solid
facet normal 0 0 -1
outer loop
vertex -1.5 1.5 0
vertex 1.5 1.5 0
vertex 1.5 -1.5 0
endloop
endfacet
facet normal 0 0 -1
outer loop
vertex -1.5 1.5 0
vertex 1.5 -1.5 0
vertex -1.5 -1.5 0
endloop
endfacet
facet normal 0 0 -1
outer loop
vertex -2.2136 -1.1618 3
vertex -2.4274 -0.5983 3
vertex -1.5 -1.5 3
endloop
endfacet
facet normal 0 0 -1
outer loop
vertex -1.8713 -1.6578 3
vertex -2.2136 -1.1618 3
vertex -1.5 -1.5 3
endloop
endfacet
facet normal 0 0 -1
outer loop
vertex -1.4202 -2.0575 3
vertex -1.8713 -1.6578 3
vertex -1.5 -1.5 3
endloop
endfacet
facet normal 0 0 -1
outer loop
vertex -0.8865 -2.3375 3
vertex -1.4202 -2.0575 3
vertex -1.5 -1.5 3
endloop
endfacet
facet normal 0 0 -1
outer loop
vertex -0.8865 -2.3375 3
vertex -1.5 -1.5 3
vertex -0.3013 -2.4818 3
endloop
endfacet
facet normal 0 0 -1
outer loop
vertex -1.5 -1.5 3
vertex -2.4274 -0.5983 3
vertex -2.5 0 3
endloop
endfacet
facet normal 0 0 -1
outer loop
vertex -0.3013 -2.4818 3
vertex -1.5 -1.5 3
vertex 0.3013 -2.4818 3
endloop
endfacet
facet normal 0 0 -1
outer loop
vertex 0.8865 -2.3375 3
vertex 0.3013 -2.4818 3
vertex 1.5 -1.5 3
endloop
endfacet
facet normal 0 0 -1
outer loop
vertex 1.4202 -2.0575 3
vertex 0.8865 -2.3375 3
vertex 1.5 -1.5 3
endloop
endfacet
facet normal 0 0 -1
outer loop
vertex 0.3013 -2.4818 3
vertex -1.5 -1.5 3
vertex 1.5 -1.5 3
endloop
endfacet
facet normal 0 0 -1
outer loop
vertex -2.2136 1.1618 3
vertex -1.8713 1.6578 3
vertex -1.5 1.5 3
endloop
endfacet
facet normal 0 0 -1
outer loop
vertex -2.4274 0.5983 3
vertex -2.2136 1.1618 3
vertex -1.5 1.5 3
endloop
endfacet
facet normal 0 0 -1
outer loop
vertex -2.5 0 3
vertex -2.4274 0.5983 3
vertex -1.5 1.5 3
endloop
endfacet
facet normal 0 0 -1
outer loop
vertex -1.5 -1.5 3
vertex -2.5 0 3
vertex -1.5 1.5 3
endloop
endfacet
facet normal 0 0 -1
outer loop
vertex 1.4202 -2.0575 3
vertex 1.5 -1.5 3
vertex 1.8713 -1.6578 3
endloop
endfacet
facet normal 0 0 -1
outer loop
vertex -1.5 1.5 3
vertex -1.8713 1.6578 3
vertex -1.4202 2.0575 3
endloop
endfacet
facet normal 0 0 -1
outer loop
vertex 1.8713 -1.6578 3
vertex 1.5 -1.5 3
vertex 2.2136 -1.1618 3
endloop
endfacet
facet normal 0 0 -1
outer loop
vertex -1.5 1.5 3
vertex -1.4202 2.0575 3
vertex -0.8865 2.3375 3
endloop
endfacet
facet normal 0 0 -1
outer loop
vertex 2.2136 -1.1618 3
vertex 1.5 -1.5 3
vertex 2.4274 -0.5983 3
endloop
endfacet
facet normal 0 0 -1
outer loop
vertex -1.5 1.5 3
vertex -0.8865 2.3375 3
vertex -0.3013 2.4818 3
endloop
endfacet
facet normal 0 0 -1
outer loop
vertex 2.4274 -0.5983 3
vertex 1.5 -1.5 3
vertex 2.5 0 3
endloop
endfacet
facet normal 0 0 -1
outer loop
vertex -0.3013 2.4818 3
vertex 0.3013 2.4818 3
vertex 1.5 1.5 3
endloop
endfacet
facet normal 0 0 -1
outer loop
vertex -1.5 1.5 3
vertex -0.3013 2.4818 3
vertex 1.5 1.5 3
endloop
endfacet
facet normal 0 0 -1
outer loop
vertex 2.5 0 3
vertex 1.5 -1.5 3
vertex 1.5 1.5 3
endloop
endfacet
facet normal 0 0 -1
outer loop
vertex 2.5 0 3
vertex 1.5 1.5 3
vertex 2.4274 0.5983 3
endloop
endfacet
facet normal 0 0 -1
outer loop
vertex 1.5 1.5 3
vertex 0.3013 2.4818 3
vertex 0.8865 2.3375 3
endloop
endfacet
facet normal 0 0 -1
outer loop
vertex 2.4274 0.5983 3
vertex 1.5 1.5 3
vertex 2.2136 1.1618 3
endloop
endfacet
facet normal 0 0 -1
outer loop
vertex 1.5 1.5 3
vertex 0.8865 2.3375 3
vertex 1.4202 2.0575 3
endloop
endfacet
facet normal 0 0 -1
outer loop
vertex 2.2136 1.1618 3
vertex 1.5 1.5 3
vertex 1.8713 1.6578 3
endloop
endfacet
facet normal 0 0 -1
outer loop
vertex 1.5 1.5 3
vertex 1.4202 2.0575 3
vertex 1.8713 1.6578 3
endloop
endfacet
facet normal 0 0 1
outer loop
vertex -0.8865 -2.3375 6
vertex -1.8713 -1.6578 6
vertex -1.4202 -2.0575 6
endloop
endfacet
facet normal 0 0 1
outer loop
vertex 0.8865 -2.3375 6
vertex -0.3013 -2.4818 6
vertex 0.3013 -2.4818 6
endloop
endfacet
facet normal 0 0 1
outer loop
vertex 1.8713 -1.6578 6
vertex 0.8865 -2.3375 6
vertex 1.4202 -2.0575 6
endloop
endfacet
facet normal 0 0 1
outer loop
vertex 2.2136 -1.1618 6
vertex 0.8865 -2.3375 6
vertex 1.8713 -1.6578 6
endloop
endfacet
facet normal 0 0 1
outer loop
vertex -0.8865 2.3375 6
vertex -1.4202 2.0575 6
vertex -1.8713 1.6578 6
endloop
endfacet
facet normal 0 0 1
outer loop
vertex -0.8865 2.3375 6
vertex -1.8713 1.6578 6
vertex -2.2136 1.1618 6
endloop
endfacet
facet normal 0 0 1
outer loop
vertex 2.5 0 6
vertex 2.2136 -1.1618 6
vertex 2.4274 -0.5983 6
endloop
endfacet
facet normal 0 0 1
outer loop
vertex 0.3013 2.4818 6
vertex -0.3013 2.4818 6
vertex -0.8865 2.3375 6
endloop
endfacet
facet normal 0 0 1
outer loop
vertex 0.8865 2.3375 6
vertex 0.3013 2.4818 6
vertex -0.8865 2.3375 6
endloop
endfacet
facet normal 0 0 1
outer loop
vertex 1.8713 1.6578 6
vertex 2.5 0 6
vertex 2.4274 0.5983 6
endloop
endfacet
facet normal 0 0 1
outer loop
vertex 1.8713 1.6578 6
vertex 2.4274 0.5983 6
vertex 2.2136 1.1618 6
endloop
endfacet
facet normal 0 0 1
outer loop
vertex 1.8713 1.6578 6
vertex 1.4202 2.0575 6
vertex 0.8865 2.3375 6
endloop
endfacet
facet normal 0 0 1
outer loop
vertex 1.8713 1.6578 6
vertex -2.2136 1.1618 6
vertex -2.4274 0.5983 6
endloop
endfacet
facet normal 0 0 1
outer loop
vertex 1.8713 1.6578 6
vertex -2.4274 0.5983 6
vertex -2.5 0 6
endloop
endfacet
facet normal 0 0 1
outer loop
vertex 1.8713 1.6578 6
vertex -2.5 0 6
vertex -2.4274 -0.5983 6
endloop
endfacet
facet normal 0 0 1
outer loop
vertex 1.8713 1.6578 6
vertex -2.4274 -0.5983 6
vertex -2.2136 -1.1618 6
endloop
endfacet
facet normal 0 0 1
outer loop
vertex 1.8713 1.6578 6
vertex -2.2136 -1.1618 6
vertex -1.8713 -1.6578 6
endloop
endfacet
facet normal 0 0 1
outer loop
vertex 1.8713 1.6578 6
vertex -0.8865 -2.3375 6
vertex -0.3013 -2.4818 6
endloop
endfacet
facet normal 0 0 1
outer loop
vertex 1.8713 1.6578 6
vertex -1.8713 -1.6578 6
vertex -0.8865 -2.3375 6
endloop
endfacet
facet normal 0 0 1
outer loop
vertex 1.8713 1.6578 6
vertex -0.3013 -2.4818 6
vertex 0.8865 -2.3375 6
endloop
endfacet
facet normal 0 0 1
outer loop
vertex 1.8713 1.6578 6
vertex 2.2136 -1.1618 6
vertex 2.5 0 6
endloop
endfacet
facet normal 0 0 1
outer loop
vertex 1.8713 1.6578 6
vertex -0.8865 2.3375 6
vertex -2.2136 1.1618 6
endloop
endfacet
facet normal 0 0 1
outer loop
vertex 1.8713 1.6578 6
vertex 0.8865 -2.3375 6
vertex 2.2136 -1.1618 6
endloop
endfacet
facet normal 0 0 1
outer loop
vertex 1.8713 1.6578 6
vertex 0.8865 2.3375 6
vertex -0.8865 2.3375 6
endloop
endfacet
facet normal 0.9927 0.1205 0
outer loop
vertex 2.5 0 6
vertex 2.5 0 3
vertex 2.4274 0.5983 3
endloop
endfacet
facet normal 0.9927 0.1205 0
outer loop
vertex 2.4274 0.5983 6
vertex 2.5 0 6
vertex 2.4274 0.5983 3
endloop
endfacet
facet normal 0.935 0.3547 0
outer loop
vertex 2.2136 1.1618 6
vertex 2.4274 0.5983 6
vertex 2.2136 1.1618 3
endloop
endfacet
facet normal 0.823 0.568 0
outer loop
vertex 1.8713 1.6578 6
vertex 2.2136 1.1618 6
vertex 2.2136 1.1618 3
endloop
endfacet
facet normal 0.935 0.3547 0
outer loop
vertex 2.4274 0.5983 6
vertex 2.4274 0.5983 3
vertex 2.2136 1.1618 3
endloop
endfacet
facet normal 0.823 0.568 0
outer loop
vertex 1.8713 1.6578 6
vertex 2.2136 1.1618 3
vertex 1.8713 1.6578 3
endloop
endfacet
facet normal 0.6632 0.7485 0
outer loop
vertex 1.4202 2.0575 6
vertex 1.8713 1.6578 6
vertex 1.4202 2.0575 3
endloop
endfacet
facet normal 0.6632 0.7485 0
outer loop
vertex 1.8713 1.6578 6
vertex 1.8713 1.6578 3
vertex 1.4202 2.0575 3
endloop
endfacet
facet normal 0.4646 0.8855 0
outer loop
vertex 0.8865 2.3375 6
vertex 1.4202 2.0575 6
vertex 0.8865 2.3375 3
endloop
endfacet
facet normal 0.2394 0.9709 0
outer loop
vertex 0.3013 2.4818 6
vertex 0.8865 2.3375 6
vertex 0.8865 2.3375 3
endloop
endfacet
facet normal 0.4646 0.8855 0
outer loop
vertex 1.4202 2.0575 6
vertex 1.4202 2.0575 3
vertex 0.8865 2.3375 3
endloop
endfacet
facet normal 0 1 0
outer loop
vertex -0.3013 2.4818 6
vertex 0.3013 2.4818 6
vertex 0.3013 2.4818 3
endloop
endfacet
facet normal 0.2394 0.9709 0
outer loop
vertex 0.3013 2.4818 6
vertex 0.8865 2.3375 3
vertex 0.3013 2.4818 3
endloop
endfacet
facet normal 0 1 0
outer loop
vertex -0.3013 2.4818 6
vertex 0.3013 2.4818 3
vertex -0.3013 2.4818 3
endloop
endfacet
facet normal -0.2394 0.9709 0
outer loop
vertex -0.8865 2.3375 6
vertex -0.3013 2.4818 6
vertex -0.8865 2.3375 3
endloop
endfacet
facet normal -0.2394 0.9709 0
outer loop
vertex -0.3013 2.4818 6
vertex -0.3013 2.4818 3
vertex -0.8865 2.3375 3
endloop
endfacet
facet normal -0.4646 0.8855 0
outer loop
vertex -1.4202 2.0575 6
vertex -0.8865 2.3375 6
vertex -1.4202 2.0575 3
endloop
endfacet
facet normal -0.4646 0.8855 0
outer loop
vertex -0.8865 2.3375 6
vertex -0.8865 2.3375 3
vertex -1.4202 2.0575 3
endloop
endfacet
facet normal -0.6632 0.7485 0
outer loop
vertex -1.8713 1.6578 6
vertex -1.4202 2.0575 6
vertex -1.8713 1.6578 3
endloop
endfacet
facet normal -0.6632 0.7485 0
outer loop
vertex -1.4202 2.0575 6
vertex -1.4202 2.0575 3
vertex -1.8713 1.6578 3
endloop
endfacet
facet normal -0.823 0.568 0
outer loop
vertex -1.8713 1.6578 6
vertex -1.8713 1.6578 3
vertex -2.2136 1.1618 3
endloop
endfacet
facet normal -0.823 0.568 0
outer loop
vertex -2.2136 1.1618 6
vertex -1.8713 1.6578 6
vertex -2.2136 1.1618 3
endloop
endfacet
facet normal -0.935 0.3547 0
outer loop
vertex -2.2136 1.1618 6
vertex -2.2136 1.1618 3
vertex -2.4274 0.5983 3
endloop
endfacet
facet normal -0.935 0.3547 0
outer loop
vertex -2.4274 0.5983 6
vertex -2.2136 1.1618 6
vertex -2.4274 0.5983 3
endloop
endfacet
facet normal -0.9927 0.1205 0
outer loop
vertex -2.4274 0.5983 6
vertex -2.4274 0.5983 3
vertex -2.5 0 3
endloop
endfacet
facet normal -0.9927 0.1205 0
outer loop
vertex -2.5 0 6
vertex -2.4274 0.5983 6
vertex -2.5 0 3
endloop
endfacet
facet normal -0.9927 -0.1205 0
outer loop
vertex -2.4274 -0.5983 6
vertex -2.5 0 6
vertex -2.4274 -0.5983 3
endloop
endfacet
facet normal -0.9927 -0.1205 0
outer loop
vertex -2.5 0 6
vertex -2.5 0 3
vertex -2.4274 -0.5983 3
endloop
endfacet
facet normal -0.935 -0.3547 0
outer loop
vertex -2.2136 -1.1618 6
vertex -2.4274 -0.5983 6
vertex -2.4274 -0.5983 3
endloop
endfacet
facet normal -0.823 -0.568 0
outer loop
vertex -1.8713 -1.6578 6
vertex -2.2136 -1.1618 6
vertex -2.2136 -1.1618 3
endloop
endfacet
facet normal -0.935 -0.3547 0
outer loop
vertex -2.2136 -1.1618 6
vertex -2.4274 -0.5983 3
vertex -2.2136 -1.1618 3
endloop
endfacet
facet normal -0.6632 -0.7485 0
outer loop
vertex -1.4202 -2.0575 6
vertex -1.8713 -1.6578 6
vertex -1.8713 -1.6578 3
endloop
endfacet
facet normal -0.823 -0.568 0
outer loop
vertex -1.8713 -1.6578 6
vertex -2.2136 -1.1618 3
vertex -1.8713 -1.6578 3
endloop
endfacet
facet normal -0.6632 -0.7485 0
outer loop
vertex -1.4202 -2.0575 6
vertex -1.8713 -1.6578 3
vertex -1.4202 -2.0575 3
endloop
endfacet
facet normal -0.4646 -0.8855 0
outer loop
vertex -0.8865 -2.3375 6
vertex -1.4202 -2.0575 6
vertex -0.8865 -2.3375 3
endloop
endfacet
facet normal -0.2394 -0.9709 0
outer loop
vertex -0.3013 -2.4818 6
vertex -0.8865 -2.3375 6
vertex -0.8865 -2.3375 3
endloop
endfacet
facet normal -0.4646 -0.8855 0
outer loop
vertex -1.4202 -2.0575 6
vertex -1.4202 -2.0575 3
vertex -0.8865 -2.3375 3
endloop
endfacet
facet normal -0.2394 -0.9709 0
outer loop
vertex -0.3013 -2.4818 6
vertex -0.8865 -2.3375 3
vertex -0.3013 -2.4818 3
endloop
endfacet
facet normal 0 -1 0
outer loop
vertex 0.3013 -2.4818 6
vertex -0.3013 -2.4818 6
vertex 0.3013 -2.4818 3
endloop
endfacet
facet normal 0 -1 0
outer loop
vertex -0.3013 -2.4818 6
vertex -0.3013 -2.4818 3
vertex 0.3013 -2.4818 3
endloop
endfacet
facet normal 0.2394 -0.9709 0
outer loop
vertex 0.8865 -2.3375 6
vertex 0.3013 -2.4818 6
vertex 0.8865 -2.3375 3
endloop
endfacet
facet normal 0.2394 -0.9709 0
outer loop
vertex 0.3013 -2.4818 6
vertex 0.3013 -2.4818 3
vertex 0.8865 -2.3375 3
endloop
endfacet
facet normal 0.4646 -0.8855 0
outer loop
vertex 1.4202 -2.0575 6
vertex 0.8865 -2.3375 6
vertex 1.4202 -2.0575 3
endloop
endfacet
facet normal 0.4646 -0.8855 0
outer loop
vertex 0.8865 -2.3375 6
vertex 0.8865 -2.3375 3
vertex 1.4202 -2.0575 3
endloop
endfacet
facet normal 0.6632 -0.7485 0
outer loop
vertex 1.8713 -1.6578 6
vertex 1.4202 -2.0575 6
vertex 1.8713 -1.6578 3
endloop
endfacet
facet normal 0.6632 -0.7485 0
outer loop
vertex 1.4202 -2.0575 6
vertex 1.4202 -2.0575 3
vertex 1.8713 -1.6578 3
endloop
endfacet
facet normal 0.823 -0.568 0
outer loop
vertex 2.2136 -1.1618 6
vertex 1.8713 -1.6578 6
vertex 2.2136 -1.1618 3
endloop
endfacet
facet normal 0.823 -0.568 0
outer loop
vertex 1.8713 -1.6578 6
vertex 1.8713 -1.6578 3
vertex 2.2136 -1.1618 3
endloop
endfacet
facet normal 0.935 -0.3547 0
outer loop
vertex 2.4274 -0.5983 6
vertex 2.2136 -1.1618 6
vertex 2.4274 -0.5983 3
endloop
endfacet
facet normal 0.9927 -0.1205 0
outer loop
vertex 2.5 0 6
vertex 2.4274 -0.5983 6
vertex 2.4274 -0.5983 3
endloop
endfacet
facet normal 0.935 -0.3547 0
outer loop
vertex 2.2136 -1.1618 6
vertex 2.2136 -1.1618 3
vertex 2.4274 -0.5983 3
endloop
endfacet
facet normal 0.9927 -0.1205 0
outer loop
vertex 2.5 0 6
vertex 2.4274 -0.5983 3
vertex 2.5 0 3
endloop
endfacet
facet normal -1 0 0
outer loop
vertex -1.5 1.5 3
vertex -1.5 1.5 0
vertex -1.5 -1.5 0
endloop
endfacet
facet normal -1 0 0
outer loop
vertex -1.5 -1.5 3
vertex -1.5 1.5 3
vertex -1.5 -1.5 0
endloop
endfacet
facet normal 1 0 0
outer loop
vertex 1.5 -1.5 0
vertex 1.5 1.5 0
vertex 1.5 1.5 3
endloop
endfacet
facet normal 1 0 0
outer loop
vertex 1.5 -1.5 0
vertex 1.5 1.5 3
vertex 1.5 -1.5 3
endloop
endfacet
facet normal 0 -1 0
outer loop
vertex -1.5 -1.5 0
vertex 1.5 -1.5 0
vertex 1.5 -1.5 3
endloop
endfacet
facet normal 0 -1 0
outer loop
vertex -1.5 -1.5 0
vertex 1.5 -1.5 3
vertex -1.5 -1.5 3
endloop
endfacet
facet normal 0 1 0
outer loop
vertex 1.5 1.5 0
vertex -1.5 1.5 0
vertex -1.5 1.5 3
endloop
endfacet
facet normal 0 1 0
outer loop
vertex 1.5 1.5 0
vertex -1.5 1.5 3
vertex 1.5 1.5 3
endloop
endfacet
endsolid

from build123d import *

# Parameters (mm, degrees)
BOSS_EXTRUDE1_DEPTH = 3
SKETCH2_R           = 2.5
BOSS_EXTRUDE2_DEPTH = 3


with BuildPart() as part:
    # Sketch1 → Boss-Extrude1 (new body)
    with BuildSketch(Plane.XY):
        Polygon((-1.5, 0), (-1.5, 1.5), (1.5, 1.5), (1.5, -1.5), (-1.5, -1.5), align=None)
    extrude(amount=BOSS_EXTRUDE1_DEPTH)

    # Sketch2 → Boss-Extrude2 (add)
    with BuildSketch(Plane.XY.offset(3)):
        Circle(SKETCH2_R)
    extrude(amount=BOSS_EXTRUDE2_DEPTH)


solid = part.part
